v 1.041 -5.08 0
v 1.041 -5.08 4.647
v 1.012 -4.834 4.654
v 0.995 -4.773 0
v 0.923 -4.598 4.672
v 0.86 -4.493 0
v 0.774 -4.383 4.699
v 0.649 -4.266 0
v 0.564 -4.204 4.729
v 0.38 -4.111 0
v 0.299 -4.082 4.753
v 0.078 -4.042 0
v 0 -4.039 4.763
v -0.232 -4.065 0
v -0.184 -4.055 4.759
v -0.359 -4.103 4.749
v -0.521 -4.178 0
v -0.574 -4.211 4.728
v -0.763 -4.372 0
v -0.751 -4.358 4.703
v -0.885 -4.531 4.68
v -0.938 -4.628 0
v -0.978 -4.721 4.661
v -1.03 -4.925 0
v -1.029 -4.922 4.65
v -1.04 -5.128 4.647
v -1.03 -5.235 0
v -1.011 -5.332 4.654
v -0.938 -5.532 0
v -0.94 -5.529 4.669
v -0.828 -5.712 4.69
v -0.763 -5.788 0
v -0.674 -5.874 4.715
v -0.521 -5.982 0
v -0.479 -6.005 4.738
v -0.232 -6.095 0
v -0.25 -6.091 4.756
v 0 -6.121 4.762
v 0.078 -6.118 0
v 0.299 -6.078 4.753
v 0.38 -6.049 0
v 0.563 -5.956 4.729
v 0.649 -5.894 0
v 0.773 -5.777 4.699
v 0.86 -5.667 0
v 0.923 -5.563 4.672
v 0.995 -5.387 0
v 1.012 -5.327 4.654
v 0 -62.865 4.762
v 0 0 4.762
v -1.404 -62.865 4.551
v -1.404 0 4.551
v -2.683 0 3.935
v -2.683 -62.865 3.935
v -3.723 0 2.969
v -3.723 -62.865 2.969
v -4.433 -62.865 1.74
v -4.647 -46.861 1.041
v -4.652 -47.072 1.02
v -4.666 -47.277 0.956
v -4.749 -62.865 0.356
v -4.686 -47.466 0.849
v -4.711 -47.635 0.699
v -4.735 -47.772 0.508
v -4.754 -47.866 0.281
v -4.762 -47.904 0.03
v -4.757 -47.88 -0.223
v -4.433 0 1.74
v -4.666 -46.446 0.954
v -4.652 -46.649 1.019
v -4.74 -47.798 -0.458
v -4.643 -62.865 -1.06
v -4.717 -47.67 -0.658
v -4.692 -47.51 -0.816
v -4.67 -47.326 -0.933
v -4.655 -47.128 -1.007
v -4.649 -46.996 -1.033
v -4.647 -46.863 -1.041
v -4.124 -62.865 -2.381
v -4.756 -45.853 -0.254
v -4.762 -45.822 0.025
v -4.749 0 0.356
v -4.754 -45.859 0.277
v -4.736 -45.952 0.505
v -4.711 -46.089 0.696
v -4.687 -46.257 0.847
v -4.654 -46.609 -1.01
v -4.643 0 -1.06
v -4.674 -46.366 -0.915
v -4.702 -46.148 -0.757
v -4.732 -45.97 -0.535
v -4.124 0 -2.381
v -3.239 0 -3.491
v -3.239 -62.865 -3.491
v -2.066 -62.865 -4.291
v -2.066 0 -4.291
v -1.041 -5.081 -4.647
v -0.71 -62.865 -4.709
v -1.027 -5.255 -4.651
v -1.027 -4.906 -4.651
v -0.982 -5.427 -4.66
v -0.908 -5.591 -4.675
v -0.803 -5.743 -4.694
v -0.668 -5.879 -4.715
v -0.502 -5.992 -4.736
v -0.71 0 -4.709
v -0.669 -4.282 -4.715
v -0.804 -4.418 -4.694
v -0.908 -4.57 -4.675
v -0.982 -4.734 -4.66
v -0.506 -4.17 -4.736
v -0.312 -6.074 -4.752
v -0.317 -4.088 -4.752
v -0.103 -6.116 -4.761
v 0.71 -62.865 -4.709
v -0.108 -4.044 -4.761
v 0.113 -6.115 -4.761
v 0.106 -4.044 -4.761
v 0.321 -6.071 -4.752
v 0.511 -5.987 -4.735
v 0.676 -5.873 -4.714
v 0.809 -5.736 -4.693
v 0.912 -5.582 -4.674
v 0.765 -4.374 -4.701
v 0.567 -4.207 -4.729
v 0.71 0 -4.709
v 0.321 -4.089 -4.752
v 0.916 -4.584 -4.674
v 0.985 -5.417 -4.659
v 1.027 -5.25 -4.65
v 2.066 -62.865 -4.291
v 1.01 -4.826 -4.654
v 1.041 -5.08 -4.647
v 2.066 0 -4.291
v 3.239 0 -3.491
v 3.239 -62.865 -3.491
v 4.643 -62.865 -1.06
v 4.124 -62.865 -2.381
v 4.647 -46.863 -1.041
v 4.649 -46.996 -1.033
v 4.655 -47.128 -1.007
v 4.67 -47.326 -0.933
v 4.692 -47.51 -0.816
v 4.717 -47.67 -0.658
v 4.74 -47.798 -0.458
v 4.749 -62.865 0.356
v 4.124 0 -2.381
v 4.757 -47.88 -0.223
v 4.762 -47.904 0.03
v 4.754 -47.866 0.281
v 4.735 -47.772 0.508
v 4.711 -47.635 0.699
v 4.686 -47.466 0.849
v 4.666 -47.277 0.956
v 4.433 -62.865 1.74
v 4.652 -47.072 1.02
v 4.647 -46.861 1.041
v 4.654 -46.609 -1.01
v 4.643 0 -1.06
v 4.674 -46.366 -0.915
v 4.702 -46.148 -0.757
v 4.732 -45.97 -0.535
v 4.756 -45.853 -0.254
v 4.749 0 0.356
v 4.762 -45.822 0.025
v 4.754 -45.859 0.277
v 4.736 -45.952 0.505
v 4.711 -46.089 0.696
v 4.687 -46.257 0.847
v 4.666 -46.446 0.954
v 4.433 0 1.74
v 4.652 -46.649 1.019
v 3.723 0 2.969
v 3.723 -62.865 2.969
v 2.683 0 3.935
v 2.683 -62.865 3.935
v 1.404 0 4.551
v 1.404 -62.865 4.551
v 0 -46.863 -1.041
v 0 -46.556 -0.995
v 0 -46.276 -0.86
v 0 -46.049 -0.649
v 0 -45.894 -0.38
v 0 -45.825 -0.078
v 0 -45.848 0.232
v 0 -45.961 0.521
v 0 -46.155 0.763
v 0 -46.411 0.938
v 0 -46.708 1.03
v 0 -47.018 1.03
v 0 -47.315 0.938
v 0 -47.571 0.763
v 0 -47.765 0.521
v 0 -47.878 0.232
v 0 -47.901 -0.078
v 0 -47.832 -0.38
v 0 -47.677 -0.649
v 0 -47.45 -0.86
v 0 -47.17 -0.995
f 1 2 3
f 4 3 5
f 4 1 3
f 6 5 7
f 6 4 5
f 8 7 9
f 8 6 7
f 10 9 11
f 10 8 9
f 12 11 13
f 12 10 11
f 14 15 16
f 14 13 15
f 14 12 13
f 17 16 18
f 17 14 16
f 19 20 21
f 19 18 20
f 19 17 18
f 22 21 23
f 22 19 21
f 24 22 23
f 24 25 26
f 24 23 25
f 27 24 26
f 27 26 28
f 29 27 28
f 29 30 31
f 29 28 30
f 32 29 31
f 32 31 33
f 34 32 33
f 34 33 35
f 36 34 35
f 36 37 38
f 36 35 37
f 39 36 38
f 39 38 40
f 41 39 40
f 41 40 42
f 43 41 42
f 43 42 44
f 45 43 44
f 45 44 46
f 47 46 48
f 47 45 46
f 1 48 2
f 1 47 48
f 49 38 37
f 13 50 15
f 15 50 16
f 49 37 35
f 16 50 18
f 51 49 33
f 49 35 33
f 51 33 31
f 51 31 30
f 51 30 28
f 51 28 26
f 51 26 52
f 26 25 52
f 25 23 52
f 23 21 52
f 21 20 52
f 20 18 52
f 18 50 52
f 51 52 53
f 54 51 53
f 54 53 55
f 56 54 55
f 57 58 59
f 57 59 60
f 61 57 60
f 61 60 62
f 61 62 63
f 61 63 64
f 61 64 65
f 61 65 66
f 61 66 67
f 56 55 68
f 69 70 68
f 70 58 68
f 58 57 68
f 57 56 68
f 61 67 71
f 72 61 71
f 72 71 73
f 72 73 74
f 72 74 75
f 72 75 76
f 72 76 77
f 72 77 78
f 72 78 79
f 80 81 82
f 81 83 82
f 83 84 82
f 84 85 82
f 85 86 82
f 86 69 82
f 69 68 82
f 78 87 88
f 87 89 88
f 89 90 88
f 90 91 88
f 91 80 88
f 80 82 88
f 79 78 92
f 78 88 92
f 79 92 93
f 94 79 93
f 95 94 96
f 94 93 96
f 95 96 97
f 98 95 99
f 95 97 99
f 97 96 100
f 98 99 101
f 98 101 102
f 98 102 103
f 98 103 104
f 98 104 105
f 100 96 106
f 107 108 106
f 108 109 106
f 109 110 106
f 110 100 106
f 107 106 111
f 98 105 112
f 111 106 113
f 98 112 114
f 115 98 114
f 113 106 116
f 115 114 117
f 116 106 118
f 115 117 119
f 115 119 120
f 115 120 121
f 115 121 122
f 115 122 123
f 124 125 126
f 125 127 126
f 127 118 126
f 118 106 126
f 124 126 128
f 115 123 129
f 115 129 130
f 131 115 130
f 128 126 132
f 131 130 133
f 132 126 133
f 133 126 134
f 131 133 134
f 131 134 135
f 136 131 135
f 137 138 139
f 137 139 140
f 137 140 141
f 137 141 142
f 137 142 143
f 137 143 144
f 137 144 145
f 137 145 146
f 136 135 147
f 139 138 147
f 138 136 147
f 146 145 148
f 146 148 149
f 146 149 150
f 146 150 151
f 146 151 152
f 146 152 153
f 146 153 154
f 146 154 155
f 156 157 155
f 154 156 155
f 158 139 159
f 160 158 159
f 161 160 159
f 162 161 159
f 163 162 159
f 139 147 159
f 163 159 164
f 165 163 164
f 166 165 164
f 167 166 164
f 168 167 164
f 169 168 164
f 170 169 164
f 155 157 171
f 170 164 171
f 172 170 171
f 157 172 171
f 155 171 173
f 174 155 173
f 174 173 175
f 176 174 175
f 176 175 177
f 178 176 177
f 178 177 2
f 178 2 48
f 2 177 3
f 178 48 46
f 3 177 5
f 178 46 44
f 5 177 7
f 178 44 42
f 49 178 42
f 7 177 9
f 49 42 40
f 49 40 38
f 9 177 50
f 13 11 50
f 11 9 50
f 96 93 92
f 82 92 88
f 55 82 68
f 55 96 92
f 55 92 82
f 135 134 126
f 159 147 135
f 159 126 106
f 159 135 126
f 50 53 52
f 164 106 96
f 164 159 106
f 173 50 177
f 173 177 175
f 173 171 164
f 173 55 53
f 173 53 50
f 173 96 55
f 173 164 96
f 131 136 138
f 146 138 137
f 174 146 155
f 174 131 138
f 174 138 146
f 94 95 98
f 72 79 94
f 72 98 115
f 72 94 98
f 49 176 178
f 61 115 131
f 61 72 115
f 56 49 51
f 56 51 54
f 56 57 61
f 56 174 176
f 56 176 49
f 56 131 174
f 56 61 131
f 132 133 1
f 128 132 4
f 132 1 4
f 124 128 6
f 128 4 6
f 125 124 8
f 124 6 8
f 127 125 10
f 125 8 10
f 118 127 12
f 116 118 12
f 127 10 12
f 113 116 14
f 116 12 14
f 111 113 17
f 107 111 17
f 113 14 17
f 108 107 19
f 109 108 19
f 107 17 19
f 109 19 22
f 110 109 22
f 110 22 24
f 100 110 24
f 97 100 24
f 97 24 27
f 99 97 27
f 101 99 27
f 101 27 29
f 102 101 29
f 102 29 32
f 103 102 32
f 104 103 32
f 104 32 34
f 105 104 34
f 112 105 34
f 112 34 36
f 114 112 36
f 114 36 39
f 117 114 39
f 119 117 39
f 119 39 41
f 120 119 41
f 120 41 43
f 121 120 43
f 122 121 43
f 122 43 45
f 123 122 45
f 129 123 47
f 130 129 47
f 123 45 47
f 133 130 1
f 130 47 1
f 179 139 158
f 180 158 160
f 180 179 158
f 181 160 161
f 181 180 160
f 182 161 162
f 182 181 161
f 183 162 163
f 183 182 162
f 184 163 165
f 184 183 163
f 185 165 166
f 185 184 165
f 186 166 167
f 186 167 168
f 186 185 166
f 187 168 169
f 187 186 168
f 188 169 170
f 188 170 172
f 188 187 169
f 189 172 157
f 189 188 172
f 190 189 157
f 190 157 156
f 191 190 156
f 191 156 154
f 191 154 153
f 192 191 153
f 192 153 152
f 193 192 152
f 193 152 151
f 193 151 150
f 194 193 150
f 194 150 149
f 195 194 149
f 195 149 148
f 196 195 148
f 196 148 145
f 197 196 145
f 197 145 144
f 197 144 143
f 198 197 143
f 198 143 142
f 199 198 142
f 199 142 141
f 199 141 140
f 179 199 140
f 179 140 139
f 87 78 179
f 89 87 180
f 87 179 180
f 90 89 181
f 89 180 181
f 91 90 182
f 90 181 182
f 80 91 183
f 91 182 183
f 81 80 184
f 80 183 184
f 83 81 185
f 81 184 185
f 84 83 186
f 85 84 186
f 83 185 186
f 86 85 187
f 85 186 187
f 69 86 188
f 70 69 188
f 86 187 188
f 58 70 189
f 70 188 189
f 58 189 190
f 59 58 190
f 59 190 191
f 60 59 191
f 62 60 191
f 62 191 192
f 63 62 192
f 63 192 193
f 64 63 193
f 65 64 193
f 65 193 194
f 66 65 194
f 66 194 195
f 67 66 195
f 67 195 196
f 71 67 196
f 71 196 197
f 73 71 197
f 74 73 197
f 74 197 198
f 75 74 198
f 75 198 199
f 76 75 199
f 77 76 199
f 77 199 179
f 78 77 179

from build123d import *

# Parameters (mm, degrees)
SKETCH1_R                           = 4.7625
BOSS_EXTRUDE1_DEPTH                 = 9.525
SKETCH2_R                           = 4.7625
BOSS_EXTRUDE2_DEPTH                 = 53.34
CUT_EXTRUDE1_REACH                  = 65.225
CUT_EXTRUDE1_END_RADIUS             = 4.7625
SKETCH3_R                           = 1.0414
CUT_EXTRUDE1_DIRECTION_2_REACH      = 65.225
CUT_EXTRUDE1_DIRECTION_2_END_RADIUS = 4.7625
CUT_EXTRUDE2_REACH                  = 65.225
CUT_EXTRUDE2_END_RADIUS             = 4.7625
SKETCH4_R                           = 1.0414
CUT_EXTRUDE2_DIRECTION_2_REACH      = 65.225
CUT_EXTRUDE2_DIRECTION_2_END_RADIUS = 4.7625


with BuildPart() as part:
    # Sketch1 → Boss-Extrude1 (new body)
    with BuildSketch(Plane(origin=(0, 0, 0), x_dir=(1, 0, 0), z_dir=(0, 1, 0))):
        with Locations(Location((0, 0, 0), (0, 0, 270))):
            Circle(SKETCH1_R)
    extrude(amount=-BOSS_EXTRUDE1_DEPTH)

    # Sketch2 → Boss-Extrude2 (add)
    with BuildSketch(Plane(origin=(0, -9.525, 0), x_dir=(-1, 0, 0), z_dir=(0, -1, 0))):
        with Locations(Location((0, 0, 0), (0, 0, 270))):
            Circle(SKETCH2_R)
    extrude(amount=BOSS_EXTRUDE2_DEPTH)

    # Cut-Extrude1: up to this cylinder (the profile starts inside it)
    cut_extrude1_end = Plane(origin=(0, -5.08, 0), z_dir=(0, 1, 0)) * Cylinder(CUT_EXTRUDE1_END_RADIUS, 140.975, mode=Mode.PRIVATE)
    # Sketch3 → Cut-Extrude1 (cut, up to the surface)
    with BuildSketch(Plane.XY, mode=Mode.PRIVATE) as cut_extrude1_sk1:
        with Locations((0, -5.08)):
            Circle(SKETCH3_R)
    cut_extrude1_tool1 = extrude(cut_extrude1_sk1.sketch, amount=-CUT_EXTRUDE1_REACH, mode=Mode.PRIVATE) & cut_extrude1_end
    add(cut_extrude1_tool1.solids().sort_by_distance((0, -5.08, 0))[0], mode=Mode.SUBTRACT)

    # Cut-Extrude1 direction 2: up to this cylinder (the profile starts inside it)
    cut_extrude1_direction_2_end = Plane(origin=(0, -5.08, 0), z_dir=(0, 1, 0)) * Cylinder(CUT_EXTRUDE1_DIRECTION_2_END_RADIUS, 140.975, mode=Mode.PRIVATE)
    # Sketch3 → Cut-Extrude1 direction 2 (cut, up to the surface)
    with BuildSketch(Plane.XY, mode=Mode.PRIVATE) as cut_extrude1_direction_2_sk1:
        with Locations((0, -5.08)):
            Circle(SKETCH3_R)
    cut_extrude1_direction_2_tool1 = extrude(cut_extrude1_direction_2_sk1.sketch, amount=CUT_EXTRUDE1_DIRECTION_2_REACH, mode=Mode.PRIVATE) & cut_extrude1_direction_2_end
    add(cut_extrude1_direction_2_tool1.solids().sort_by_distance((0, -5.08, 0))[0], mode=Mode.SUBTRACT)

    # Cut-Extrude2: up to this cylinder (the profile starts inside it)
    cut_extrude2_end = Plane(origin=(0, -46.863, 0), z_dir=(0, 1, 0)) * Cylinder(CUT_EXTRUDE2_END_RADIUS, 140.975, mode=Mode.PRIVATE)
    # Sketch4 → Cut-Extrude2 (cut, up to the surface)
    with BuildSketch(Plane(origin=(0, 0, 0), x_dir=(0, 0, -1), z_dir=(1, 0, 0)), mode=Mode.PRIVATE) as cut_extrude2_sk1:
        with Locations((0, -46.863)):
            Circle(SKETCH4_R)
    cut_extrude2_tool1 = extrude(cut_extrude2_sk1.sketch, amount=-CUT_EXTRUDE2_REACH, mode=Mode.PRIVATE) & cut_extrude2_end
    add(cut_extrude2_tool1.solids().sort_by_distance((0, -46.863, 0))[0], mode=Mode.SUBTRACT)

    # Cut-Extrude2 direction 2: up to this cylinder (the profile starts inside it)
    cut_extrude2_direction_2_end = Plane(origin=(0, -46.863, 0), z_dir=(0, 1, 0)) * Cylinder(CUT_EXTRUDE2_DIRECTION_2_END_RADIUS, 140.975, mode=Mode.PRIVATE)
    # Sketch4 → Cut-Extrude2 direction 2 (cut, up to the surface)
    with BuildSketch(Plane(origin=(0, 0, 0), x_dir=(0, 0, -1), z_dir=(1, 0, 0)), mode=Mode.PRIVATE) as cut_extrude2_direction_2_sk1:
        with Locations((0, -46.863)):
            Circle(SKETCH4_R)
    cut_extrude2_direction_2_tool1 = extrude(cut_extrude2_direction_2_sk1.sketch, amount=CUT_EXTRUDE2_DIRECTION_2_REACH, mode=Mode.PRIVATE) & cut_extrude2_direction_2_end
    add(cut_extrude2_direction_2_tool1.solids().sort_by_distance((0, -46.863, 0))[0], mode=Mode.SUBTRACT)


solid = part.part
